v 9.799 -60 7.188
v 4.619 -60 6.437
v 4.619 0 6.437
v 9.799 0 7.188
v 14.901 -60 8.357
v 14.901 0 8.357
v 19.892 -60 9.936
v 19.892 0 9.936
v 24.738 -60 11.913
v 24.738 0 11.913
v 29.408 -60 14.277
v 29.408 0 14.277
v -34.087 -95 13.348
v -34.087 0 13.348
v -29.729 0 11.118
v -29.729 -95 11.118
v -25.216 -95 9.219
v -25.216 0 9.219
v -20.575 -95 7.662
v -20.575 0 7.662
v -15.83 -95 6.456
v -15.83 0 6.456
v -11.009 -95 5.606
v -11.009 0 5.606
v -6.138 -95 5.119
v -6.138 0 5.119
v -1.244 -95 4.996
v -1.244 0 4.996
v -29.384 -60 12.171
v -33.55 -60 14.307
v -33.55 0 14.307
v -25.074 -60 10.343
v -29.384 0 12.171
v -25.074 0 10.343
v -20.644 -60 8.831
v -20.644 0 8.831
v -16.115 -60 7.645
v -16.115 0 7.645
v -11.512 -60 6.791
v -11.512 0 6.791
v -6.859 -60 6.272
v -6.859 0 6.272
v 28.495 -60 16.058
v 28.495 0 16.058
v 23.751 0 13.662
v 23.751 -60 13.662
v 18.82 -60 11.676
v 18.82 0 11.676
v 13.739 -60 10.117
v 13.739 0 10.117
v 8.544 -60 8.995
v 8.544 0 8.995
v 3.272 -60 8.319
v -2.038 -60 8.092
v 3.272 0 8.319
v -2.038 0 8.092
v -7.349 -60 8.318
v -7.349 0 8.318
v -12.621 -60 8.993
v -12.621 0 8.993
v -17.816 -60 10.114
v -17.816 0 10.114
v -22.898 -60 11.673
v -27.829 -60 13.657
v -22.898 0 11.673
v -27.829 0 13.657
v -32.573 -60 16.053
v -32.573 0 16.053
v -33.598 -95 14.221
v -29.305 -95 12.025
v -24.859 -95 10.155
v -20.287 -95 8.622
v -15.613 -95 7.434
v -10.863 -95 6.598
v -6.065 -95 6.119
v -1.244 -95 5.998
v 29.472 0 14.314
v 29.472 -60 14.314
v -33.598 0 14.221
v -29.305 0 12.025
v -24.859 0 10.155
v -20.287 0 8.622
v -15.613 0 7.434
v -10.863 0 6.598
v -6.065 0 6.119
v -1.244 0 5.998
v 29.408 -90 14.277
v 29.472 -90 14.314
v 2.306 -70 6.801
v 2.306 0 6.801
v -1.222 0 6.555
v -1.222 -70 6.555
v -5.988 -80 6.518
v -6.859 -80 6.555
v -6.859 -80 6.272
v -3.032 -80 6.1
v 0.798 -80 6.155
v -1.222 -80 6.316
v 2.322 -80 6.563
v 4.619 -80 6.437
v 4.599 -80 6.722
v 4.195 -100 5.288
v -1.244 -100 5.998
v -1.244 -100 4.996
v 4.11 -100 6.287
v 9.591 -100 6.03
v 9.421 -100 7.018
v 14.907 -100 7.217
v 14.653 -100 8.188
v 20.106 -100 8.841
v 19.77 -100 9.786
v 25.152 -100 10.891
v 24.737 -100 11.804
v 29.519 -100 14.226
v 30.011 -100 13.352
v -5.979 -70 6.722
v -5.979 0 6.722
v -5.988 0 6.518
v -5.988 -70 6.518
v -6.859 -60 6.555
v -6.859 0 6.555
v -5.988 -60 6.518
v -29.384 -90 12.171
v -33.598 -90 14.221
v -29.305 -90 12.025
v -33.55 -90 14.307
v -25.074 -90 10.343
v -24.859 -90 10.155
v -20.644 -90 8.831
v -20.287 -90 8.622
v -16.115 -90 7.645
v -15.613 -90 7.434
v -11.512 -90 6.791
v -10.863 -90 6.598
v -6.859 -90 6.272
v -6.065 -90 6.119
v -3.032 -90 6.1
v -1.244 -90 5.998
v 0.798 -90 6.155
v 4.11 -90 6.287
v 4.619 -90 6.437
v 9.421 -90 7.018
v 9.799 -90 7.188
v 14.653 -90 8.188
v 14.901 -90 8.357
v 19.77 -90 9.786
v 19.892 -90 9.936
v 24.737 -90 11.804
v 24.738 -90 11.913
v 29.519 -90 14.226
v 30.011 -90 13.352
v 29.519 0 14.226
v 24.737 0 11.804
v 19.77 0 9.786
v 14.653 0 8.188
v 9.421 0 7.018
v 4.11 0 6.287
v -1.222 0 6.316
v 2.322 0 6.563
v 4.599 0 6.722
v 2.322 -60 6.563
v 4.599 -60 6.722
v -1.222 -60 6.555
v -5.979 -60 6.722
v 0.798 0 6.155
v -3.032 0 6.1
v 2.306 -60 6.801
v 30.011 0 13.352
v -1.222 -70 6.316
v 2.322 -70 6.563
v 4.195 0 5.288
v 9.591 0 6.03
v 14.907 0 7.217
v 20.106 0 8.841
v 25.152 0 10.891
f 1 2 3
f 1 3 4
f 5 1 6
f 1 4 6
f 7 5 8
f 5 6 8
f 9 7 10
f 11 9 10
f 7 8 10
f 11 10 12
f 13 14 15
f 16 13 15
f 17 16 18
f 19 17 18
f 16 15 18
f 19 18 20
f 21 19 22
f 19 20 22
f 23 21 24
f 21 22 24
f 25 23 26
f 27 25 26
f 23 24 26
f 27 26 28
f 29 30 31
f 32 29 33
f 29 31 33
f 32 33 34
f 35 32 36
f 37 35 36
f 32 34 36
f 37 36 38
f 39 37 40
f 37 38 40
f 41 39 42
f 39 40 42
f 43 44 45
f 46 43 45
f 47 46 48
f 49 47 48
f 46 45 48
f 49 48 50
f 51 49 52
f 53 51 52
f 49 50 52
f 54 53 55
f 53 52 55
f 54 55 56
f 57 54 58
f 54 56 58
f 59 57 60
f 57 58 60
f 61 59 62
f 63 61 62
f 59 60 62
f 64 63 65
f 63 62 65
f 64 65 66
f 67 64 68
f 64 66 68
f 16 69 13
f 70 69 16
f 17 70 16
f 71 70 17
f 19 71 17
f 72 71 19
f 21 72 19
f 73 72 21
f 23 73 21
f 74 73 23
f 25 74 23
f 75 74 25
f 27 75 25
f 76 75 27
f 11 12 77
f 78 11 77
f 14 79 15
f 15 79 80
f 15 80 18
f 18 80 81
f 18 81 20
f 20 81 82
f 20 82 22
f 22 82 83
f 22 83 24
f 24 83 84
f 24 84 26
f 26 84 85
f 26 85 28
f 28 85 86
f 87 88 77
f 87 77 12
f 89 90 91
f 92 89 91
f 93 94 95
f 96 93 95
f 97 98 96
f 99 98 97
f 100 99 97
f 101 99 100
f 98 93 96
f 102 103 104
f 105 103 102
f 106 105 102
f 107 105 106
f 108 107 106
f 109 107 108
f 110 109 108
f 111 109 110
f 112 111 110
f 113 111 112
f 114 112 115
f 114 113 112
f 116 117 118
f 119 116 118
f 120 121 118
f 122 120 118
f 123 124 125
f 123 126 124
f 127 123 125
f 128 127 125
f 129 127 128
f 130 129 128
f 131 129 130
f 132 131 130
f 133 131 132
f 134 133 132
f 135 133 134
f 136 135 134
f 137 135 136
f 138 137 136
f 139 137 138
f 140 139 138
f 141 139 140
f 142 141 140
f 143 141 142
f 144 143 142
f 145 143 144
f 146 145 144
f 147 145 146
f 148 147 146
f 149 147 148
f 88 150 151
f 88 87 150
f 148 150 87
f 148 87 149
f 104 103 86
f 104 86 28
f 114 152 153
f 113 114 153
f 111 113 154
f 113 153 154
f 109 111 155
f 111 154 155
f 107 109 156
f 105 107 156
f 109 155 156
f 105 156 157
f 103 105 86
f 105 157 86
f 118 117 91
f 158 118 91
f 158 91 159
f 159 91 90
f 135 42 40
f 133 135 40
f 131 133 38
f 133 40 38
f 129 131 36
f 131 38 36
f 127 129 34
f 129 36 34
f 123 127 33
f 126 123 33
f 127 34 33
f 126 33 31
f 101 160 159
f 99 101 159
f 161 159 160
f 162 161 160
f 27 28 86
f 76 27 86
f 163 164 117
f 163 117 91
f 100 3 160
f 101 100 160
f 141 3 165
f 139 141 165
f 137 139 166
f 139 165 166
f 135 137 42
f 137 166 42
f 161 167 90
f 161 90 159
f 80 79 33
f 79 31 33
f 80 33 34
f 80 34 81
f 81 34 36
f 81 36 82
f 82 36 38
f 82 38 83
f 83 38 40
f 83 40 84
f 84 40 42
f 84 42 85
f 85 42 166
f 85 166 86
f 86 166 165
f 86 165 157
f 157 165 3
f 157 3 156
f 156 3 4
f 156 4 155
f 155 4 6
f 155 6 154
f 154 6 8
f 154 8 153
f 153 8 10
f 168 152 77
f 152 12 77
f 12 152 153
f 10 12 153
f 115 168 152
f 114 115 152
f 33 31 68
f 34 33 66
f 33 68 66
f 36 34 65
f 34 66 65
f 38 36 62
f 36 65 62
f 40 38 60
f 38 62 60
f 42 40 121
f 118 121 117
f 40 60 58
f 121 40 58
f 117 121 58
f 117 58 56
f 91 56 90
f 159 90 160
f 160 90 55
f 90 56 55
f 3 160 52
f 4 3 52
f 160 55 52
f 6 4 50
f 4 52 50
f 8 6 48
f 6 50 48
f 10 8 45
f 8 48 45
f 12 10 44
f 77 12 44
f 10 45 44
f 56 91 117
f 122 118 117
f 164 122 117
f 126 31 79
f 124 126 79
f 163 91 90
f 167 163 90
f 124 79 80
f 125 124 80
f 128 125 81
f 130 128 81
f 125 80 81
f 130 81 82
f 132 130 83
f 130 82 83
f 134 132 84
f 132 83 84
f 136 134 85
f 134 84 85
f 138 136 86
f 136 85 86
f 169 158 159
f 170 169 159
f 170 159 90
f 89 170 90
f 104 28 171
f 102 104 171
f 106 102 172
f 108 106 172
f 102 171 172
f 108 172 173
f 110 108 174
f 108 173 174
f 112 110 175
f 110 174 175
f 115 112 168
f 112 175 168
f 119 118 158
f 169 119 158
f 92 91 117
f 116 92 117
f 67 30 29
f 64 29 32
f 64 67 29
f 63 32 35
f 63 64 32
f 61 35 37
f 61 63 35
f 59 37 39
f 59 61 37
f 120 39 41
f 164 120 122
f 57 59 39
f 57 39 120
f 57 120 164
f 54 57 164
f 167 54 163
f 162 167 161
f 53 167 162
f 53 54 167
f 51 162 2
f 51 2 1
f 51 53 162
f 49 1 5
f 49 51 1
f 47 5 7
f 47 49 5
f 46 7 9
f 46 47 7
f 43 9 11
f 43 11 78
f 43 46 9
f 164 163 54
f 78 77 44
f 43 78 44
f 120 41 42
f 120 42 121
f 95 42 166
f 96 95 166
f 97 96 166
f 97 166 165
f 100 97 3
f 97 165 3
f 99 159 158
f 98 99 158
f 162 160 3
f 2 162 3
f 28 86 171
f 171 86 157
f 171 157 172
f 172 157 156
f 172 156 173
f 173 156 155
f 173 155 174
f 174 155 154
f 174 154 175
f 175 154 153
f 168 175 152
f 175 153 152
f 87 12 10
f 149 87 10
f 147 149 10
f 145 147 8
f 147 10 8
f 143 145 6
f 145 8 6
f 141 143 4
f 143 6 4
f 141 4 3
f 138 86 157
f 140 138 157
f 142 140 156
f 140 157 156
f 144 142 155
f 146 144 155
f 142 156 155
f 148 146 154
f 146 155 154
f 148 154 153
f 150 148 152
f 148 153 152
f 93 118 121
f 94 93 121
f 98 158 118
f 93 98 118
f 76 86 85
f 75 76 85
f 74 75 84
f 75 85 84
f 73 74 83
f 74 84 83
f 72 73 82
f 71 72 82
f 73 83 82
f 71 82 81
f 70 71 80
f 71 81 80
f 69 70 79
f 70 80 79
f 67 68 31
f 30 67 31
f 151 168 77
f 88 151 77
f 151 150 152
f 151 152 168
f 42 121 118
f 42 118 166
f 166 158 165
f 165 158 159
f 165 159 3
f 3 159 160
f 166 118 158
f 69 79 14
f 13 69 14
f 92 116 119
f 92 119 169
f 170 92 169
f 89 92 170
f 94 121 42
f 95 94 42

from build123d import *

# Parameters (mm, degrees)
F1_DEPTH = 100
F2_DEPTH = 95
F3_DEPTH = 90
F4_DEPTH = 80
F5_DEPTH = 70
F6_DEPTH = 60


with BuildPart() as f1:
    # F0 (on Front) → F1 (new body)
    with BuildSketch(Plane.XZ):
        with BuildLine():
            ThreePointArc((29.519392, 14.226209), (14.652679, 8.187611), (-1.243566, 5.998271))
            Line((-1.243566, 5.998271), (-1.243566, 4.995558))
            ThreePointArc((-1.243566, 4.995558), (14.906982, 7.217176), (30.011451, 13.351573))
            Line((30.011451, 13.351573), (29.519392, 14.226209))
        make_face()
    extrude(amount=F1_DEPTH)


with BuildPart() as f2:
    # F0 (on Front) → F2 (new body)
    with BuildSketch(Plane.XZ):
        with BuildLine():
            Line((-1.243566, 4.995558), (-1.243566, 5.998271))
            ThreePointArc((-1.243566, 5.998271), (-17.961008, 7.984297), (-33.598137, 14.22107))
            Line((-33.598137, 14.22107), (-34.087008, 13.347566))
            ThreePointArc((-34.087008, 13.347566), (-18.213747, 7.014798), (-1.243566, 4.995558))
        make_face()
    extrude(amount=F2_DEPTH)


with BuildPart() as f3:
    # F0 (on Front) → F3 (new body)
    with BuildSketch(Plane.XZ):
        with BuildLine():
            ThreePointArc((-33.598137, 14.22107), (-17.961008, 7.984297), (-1.243566, 5.998271))
            ThreePointArc((-1.243566, 5.998271), (14.652679, 8.187611), (29.519392, 14.226209))
            Line((29.519392, 14.226209), (30.011451, 13.351573))
            Line((30.011451, 13.351573), (29.472458, 14.313632))
            Line((29.472458, 14.313632), (29.408035, 14.277376))
            ThreePointArc((29.408035, 14.277376), (17.41231, 9.095712), (4.618581, 6.437226))
            ThreePointArc((4.618581, 6.437226), (-1.116637, 6.098977), (-6.859208, 6.272245))
            ThreePointArc((-6.859208, 6.272245), (-20.643592, 8.831314), (-33.549788, 14.30746))
            Line((-33.549788, 14.30746), (-33.598137, 14.22107))
        make_face()
    extrude(amount=F3_DEPTH)


with BuildPart() as f4:
    # F0 (on Front) → F4 (new body)
    with BuildSketch(Plane.XZ):
        with BuildLine():
            Line((-6.859208, 6.554838), (-6.859208, 6.272245))
            ThreePointArc((-6.859208, 6.272245), (-1.116637, 6.098977), (4.618581, 6.437226))
            Line((4.618581, 6.437226), (4.598699, 6.722107))
            Line((4.598699, 6.722107), (2.322486, 6.563243))
            Line((2.322486, 6.563243), (-1.221714, 6.315883))
            Line((-1.221714, 6.315883), (-5.987574, 6.517892))
            Line((-5.987574, 6.517892), (-6.859208, 6.554838))
        make_face()
    extrude(amount=F4_DEPTH)


with BuildPart() as f5:
    # F0 (on Front) → F5 (new body)
    with BuildSketch(Plane.XZ):
        Polygon((-5.978918, 6.722107), (-5.987574, 6.517892), (-1.221714, 6.315883), (2.322486, 6.563243), (2.30589, 6.80104), (-1.221714, 6.554838), align=None)
    extrude(amount=F5_DEPTH)


with BuildPart() as f6:
    # F0 (on Front) → F6 (new body)
    with BuildSketch(Plane.XZ):
        with BuildLine():
            Line((-32.573023, 16.05272), (-33.549788, 14.30746))
            ThreePointArc((-33.549788, 14.30746), (-20.643592, 8.831314), (-6.859208, 6.272245))
            Line((-6.859208, 6.272245), (-6.859208, 6.554838))
            Line((-6.859208, 6.554838), (-5.987574, 6.517892))
            Line((-5.987574, 6.517892), (-5.978918, 6.722107))
            Line((-5.978918, 6.722107), (-1.221714, 6.554838))
            Line((-1.221714, 6.554838), (2.30589, 6.80104))
            Line((2.30589, 6.80104), (2.322486, 6.563243))
            Line((2.322486, 6.563243), (4.598699, 6.722107))
            Line((4.598699, 6.722107), (4.618581, 6.437226))
            ThreePointArc((4.618581, 6.437226), (17.41231, 9.095712), (29.408035, 14.277376))
            Line((29.408035, 14.277376), (29.472458, 14.313632))
            Line((29.472458, 14.313632), (28.495025, 16.058276))
            ThreePointArc((28.495025, 16.058276), (-2.038275, 8.092313), (-32.573023, 16.05272))
        make_face()
    extrude(amount=F6_DEPTH)


solid = Compound([f1.part, f2.part, f3.part, f4.part, f5.part, f6.part])
